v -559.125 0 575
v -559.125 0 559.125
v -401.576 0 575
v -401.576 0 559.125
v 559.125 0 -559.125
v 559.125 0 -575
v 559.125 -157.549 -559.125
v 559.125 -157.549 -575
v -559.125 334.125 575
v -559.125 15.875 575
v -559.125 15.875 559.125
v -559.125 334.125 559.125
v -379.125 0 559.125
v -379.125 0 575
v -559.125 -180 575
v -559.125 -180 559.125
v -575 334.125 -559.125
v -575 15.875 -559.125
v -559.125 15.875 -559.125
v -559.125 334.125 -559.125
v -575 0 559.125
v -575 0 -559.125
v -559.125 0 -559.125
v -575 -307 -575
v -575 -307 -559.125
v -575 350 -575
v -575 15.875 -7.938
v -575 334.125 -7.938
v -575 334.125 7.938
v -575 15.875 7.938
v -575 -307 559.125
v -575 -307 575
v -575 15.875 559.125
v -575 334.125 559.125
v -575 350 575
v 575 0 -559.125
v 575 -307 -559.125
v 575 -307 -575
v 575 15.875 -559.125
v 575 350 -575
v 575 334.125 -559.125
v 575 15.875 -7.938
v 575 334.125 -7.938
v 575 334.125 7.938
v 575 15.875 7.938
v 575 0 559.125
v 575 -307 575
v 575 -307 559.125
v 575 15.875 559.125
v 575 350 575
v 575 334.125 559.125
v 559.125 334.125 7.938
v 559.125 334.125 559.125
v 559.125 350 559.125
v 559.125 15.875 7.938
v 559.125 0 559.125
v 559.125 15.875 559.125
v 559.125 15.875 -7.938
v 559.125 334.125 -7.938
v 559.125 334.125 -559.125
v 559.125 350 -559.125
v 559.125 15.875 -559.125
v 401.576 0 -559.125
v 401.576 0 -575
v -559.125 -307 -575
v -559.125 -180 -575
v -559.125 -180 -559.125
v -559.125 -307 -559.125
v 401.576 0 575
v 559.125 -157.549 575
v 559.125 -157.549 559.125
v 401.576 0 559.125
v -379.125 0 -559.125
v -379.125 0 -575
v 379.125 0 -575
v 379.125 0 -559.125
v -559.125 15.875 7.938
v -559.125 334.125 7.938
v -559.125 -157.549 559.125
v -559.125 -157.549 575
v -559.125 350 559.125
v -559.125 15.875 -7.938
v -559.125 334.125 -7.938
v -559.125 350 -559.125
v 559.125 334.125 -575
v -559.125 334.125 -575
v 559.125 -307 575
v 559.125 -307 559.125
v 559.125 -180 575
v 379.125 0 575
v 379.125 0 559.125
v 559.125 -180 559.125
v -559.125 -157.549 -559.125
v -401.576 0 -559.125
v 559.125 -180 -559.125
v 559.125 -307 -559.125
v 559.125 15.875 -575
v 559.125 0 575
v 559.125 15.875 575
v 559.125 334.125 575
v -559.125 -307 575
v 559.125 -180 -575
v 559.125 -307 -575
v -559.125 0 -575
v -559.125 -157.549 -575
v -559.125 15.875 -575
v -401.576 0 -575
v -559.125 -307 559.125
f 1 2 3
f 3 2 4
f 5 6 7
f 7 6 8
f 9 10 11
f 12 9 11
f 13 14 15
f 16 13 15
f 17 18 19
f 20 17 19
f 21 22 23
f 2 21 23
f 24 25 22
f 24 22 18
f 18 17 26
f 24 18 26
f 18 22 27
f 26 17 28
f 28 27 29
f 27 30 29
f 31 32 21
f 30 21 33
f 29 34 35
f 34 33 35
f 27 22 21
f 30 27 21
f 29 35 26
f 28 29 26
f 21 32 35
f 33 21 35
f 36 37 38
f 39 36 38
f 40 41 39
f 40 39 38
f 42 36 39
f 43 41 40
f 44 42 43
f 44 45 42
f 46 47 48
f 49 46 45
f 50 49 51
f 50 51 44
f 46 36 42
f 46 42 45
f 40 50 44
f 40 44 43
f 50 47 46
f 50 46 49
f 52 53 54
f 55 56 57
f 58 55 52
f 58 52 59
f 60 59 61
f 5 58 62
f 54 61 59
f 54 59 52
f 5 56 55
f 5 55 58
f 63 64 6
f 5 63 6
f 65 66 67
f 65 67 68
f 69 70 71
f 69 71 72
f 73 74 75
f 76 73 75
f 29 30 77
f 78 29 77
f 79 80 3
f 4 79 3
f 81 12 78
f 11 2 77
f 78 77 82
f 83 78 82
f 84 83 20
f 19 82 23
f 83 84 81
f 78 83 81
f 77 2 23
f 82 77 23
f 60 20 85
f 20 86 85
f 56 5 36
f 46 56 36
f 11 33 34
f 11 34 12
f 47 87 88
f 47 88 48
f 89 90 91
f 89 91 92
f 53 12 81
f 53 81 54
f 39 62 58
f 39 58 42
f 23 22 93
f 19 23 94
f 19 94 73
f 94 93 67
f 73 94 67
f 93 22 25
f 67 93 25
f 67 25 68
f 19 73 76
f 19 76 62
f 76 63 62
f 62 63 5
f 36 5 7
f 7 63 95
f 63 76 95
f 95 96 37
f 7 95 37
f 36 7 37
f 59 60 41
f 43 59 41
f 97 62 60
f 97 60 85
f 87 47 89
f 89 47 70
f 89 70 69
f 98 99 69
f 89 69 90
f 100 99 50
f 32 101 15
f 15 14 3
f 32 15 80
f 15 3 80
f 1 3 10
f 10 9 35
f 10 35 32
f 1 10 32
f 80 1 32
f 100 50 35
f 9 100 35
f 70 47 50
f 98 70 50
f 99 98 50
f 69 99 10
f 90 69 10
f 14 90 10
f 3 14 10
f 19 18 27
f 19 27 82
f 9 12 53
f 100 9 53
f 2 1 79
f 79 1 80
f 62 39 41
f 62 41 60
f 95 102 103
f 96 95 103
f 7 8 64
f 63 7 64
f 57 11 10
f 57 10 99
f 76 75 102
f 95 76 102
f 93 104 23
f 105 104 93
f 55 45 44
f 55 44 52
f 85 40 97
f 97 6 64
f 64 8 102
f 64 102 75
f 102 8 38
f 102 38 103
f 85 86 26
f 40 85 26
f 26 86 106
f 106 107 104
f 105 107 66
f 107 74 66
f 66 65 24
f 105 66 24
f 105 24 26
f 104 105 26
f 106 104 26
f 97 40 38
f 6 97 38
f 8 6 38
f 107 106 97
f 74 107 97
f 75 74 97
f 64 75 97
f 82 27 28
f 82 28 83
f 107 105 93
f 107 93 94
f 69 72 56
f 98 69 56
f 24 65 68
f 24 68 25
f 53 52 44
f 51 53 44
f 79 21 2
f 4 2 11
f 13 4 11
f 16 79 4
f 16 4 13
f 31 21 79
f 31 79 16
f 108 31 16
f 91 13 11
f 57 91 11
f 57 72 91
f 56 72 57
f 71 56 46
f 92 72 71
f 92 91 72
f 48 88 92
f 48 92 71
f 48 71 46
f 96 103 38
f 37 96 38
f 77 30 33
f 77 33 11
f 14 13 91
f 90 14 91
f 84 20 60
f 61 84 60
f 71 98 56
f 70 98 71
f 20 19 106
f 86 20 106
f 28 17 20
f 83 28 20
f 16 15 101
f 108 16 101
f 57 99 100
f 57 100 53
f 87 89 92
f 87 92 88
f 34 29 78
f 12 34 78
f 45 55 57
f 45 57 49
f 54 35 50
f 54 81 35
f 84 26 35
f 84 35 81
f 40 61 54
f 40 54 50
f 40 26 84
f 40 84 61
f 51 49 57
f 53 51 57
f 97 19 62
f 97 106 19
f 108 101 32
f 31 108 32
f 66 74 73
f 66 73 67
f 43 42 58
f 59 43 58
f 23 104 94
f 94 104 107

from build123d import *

# Parameters (mm, degrees)
SKETCH1_W                                = 1150
SKETCH1_H                                = 1150
SKETCH1_W_2                              = 1118.25
SKETCH1_H_2                              = 1118.25
BOSS_EXTRUDE1_DEPTH                      = 15.875
SKETCH2_W                                = 15.875
SKETCH2_H                                = 15.875
BOSS_EXTRUDE2_DEPTH                      = 318.25
SKETCH3_W                                = 1150
SKETCH3_H                                = 1150
SKETCH3_W_2                              = 1118.25
SKETCH3_H_2                              = 1118.25
BOSS_EXTRUDE3_DEPTH                      = 15.875
BOSS_EXTRUDE4_DEPTH                      = 15.875
MIRROR2_AT_THE_SECOND_PLANE_COPY_1_DEPTH = 15.875


with BuildPart() as part:
    # Sketch1 → Boss-Extrude1 (new body)
    with BuildSketch(Plane(origin=(0, 0, 0), x_dir=(1, 0, 0), z_dir=(0, 1, 0))):
        Rectangle(SKETCH1_W, SKETCH1_H)
        Rectangle(SKETCH1_W_2, SKETCH1_H_2, mode=Mode.SUBTRACT)
    extrude(amount=BOSS_EXTRUDE1_DEPTH)

    # Sketch2 → Boss-Extrude2 (add)
    with BuildSketch(Plane(origin=(0, 15.875, 0), x_dir=(1, 0, 0), z_dir=(0, 1, 0))):
        with Locations((-567.0625, 567.0625)):
            Rectangle(SKETCH2_W, SKETCH2_H)
        with Locations((-567.0625, -567.0625)):
            Rectangle(SKETCH2_W, SKETCH2_H)
        with Locations((-567.0625, 0)):
            Rectangle(SKETCH2_W, SKETCH2_H)
    boss_extrude2 = extrude(amount=BOSS_EXTRUDE2_DEPTH)

    # Sketch3 → Boss-Extrude3 (add)
    with BuildSketch(Plane(origin=(0, 334.125, 0), x_dir=(1, 0, 0), z_dir=(0, 1, 0))):
        Rectangle(SKETCH3_W, SKETCH3_H)
        Rectangle(SKETCH3_W_2, SKETCH3_H_2, mode=Mode.SUBTRACT)
    extrude(amount=BOSS_EXTRUDE3_DEPTH)

    # Mirror1: Boss-Extrude2 across plane
    add(boss_extrude2.mirror(Plane(origin=(0, 0, 0), x_dir=(0, 0, 1), z_dir=(1, 0, 0))))

    # Sketch4 → Boss-Extrude4 (add)
    with BuildSketch(Plane.XY.offset(575)):
        Polygon((390.350320151, 11.225320151), (379.125, 0), (559.125, -180), (559.125, -307), (575, -307), (575, 0), (559.125, 0), (559.125, -157.549359697), align=None)
    boss_extrude4 = extrude(amount=-BOSS_EXTRUDE4_DEPTH)

    # Mirror2: Boss-Extrude4 across plane
    add(boss_extrude4.mirror(Plane(origin=(0, 0, 0), x_dir=(0, 0, 1), z_dir=(1, 0, 0))))

    # Mirror2 at the second plane: Boss-Extrude4 across plane
    add(boss_extrude4.mirror(Plane.XY))

    # Mirror2 at the second plane copy 1 sketc → Mirror2 at the second plane copy 1 (add)
    with BuildSketch(Plane(origin=(0, 0, -575), x_dir=(-1, 0, 0), z_dir=(0, 0, -1))):
        Polygon((390.350320151, 11.225320151), (379.125, 0), (559.125, -180), (559.125, -307), (575, -307), (575, 0), (559.125, 0), (559.125, -157.549359697), align=None)
    extrude(amount=-MIRROR2_AT_THE_SECOND_PLANE_COPY_1_DEPTH)


solid = part.part
